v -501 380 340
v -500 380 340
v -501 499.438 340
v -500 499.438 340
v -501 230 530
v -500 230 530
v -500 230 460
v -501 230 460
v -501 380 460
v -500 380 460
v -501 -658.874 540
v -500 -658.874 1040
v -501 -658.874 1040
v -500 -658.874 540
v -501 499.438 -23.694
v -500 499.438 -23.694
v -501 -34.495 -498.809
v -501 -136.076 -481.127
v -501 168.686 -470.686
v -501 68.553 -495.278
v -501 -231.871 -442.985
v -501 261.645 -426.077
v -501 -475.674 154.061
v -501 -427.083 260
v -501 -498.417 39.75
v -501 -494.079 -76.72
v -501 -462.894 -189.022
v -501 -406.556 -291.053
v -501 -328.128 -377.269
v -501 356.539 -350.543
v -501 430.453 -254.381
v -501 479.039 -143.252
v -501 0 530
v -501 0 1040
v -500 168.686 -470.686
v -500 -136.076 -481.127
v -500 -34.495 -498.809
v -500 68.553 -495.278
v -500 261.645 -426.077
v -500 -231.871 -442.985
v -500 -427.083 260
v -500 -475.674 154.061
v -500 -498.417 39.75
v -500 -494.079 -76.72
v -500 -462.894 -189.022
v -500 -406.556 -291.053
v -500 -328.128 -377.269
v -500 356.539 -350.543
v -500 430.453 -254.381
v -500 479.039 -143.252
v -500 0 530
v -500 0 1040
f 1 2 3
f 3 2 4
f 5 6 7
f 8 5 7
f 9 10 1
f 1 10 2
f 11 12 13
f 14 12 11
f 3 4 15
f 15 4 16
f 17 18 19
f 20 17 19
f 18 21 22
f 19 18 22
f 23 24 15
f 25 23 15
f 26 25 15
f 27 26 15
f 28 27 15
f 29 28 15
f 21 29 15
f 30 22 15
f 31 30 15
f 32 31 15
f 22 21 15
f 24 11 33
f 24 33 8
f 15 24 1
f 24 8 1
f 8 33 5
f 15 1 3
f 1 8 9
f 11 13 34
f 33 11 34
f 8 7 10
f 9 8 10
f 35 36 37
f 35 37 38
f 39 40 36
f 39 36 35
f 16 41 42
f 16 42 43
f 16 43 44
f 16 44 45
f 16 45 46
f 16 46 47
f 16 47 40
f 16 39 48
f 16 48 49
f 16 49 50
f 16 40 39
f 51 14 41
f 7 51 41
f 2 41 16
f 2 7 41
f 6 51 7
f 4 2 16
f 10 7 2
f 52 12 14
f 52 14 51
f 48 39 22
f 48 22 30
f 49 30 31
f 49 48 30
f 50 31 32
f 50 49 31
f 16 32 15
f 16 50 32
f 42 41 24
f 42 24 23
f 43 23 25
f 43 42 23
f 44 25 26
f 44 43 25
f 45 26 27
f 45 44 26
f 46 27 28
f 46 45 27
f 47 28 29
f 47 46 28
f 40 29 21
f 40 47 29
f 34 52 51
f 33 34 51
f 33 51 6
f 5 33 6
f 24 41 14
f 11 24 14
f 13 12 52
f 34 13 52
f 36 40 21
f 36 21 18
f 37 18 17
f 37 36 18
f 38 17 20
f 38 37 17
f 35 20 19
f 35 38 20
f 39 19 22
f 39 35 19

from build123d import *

# Parameters (mm, degrees)
PAD_DEPTH = 1


with BuildPart() as part:
    # Sketch → Pad (new body)
    with BuildSketch(Plane.YZ.offset(-500)):
        with BuildLine():
            ThreePointArc((-427.08313, 260), (-481.76976, -133.783027), (-231.870564, -442.985374))
            ThreePointArc((-231.870564, -442.985374), (17.120198, -499.706813), (261.645072, -426.077289))
            ThreePointArc((261.645072, -426.077289), (430.453315, -254.381492), (499.438281, -23.693945))
            Line((499.438281, 340), (499.438281, -23.693945))
            Line((380, 340), (499.438281, 340))
            Line((380, 460), (380, 340))
            Line((230, 460), (380, 460))
            Line((230, 530), (230, 460))
            Line((0, 530), (230, 530))
            Line((0, 1040), (0, 530))
            Line((-658.874021, 1040), (0, 1040))
            Line((-658.874021, 1040), (-658.874021, 540))
            Line((-427.08313, 260), (-658.874021, 540))
        make_face()
    extrude(amount=-PAD_DEPTH)


solid = part.part
